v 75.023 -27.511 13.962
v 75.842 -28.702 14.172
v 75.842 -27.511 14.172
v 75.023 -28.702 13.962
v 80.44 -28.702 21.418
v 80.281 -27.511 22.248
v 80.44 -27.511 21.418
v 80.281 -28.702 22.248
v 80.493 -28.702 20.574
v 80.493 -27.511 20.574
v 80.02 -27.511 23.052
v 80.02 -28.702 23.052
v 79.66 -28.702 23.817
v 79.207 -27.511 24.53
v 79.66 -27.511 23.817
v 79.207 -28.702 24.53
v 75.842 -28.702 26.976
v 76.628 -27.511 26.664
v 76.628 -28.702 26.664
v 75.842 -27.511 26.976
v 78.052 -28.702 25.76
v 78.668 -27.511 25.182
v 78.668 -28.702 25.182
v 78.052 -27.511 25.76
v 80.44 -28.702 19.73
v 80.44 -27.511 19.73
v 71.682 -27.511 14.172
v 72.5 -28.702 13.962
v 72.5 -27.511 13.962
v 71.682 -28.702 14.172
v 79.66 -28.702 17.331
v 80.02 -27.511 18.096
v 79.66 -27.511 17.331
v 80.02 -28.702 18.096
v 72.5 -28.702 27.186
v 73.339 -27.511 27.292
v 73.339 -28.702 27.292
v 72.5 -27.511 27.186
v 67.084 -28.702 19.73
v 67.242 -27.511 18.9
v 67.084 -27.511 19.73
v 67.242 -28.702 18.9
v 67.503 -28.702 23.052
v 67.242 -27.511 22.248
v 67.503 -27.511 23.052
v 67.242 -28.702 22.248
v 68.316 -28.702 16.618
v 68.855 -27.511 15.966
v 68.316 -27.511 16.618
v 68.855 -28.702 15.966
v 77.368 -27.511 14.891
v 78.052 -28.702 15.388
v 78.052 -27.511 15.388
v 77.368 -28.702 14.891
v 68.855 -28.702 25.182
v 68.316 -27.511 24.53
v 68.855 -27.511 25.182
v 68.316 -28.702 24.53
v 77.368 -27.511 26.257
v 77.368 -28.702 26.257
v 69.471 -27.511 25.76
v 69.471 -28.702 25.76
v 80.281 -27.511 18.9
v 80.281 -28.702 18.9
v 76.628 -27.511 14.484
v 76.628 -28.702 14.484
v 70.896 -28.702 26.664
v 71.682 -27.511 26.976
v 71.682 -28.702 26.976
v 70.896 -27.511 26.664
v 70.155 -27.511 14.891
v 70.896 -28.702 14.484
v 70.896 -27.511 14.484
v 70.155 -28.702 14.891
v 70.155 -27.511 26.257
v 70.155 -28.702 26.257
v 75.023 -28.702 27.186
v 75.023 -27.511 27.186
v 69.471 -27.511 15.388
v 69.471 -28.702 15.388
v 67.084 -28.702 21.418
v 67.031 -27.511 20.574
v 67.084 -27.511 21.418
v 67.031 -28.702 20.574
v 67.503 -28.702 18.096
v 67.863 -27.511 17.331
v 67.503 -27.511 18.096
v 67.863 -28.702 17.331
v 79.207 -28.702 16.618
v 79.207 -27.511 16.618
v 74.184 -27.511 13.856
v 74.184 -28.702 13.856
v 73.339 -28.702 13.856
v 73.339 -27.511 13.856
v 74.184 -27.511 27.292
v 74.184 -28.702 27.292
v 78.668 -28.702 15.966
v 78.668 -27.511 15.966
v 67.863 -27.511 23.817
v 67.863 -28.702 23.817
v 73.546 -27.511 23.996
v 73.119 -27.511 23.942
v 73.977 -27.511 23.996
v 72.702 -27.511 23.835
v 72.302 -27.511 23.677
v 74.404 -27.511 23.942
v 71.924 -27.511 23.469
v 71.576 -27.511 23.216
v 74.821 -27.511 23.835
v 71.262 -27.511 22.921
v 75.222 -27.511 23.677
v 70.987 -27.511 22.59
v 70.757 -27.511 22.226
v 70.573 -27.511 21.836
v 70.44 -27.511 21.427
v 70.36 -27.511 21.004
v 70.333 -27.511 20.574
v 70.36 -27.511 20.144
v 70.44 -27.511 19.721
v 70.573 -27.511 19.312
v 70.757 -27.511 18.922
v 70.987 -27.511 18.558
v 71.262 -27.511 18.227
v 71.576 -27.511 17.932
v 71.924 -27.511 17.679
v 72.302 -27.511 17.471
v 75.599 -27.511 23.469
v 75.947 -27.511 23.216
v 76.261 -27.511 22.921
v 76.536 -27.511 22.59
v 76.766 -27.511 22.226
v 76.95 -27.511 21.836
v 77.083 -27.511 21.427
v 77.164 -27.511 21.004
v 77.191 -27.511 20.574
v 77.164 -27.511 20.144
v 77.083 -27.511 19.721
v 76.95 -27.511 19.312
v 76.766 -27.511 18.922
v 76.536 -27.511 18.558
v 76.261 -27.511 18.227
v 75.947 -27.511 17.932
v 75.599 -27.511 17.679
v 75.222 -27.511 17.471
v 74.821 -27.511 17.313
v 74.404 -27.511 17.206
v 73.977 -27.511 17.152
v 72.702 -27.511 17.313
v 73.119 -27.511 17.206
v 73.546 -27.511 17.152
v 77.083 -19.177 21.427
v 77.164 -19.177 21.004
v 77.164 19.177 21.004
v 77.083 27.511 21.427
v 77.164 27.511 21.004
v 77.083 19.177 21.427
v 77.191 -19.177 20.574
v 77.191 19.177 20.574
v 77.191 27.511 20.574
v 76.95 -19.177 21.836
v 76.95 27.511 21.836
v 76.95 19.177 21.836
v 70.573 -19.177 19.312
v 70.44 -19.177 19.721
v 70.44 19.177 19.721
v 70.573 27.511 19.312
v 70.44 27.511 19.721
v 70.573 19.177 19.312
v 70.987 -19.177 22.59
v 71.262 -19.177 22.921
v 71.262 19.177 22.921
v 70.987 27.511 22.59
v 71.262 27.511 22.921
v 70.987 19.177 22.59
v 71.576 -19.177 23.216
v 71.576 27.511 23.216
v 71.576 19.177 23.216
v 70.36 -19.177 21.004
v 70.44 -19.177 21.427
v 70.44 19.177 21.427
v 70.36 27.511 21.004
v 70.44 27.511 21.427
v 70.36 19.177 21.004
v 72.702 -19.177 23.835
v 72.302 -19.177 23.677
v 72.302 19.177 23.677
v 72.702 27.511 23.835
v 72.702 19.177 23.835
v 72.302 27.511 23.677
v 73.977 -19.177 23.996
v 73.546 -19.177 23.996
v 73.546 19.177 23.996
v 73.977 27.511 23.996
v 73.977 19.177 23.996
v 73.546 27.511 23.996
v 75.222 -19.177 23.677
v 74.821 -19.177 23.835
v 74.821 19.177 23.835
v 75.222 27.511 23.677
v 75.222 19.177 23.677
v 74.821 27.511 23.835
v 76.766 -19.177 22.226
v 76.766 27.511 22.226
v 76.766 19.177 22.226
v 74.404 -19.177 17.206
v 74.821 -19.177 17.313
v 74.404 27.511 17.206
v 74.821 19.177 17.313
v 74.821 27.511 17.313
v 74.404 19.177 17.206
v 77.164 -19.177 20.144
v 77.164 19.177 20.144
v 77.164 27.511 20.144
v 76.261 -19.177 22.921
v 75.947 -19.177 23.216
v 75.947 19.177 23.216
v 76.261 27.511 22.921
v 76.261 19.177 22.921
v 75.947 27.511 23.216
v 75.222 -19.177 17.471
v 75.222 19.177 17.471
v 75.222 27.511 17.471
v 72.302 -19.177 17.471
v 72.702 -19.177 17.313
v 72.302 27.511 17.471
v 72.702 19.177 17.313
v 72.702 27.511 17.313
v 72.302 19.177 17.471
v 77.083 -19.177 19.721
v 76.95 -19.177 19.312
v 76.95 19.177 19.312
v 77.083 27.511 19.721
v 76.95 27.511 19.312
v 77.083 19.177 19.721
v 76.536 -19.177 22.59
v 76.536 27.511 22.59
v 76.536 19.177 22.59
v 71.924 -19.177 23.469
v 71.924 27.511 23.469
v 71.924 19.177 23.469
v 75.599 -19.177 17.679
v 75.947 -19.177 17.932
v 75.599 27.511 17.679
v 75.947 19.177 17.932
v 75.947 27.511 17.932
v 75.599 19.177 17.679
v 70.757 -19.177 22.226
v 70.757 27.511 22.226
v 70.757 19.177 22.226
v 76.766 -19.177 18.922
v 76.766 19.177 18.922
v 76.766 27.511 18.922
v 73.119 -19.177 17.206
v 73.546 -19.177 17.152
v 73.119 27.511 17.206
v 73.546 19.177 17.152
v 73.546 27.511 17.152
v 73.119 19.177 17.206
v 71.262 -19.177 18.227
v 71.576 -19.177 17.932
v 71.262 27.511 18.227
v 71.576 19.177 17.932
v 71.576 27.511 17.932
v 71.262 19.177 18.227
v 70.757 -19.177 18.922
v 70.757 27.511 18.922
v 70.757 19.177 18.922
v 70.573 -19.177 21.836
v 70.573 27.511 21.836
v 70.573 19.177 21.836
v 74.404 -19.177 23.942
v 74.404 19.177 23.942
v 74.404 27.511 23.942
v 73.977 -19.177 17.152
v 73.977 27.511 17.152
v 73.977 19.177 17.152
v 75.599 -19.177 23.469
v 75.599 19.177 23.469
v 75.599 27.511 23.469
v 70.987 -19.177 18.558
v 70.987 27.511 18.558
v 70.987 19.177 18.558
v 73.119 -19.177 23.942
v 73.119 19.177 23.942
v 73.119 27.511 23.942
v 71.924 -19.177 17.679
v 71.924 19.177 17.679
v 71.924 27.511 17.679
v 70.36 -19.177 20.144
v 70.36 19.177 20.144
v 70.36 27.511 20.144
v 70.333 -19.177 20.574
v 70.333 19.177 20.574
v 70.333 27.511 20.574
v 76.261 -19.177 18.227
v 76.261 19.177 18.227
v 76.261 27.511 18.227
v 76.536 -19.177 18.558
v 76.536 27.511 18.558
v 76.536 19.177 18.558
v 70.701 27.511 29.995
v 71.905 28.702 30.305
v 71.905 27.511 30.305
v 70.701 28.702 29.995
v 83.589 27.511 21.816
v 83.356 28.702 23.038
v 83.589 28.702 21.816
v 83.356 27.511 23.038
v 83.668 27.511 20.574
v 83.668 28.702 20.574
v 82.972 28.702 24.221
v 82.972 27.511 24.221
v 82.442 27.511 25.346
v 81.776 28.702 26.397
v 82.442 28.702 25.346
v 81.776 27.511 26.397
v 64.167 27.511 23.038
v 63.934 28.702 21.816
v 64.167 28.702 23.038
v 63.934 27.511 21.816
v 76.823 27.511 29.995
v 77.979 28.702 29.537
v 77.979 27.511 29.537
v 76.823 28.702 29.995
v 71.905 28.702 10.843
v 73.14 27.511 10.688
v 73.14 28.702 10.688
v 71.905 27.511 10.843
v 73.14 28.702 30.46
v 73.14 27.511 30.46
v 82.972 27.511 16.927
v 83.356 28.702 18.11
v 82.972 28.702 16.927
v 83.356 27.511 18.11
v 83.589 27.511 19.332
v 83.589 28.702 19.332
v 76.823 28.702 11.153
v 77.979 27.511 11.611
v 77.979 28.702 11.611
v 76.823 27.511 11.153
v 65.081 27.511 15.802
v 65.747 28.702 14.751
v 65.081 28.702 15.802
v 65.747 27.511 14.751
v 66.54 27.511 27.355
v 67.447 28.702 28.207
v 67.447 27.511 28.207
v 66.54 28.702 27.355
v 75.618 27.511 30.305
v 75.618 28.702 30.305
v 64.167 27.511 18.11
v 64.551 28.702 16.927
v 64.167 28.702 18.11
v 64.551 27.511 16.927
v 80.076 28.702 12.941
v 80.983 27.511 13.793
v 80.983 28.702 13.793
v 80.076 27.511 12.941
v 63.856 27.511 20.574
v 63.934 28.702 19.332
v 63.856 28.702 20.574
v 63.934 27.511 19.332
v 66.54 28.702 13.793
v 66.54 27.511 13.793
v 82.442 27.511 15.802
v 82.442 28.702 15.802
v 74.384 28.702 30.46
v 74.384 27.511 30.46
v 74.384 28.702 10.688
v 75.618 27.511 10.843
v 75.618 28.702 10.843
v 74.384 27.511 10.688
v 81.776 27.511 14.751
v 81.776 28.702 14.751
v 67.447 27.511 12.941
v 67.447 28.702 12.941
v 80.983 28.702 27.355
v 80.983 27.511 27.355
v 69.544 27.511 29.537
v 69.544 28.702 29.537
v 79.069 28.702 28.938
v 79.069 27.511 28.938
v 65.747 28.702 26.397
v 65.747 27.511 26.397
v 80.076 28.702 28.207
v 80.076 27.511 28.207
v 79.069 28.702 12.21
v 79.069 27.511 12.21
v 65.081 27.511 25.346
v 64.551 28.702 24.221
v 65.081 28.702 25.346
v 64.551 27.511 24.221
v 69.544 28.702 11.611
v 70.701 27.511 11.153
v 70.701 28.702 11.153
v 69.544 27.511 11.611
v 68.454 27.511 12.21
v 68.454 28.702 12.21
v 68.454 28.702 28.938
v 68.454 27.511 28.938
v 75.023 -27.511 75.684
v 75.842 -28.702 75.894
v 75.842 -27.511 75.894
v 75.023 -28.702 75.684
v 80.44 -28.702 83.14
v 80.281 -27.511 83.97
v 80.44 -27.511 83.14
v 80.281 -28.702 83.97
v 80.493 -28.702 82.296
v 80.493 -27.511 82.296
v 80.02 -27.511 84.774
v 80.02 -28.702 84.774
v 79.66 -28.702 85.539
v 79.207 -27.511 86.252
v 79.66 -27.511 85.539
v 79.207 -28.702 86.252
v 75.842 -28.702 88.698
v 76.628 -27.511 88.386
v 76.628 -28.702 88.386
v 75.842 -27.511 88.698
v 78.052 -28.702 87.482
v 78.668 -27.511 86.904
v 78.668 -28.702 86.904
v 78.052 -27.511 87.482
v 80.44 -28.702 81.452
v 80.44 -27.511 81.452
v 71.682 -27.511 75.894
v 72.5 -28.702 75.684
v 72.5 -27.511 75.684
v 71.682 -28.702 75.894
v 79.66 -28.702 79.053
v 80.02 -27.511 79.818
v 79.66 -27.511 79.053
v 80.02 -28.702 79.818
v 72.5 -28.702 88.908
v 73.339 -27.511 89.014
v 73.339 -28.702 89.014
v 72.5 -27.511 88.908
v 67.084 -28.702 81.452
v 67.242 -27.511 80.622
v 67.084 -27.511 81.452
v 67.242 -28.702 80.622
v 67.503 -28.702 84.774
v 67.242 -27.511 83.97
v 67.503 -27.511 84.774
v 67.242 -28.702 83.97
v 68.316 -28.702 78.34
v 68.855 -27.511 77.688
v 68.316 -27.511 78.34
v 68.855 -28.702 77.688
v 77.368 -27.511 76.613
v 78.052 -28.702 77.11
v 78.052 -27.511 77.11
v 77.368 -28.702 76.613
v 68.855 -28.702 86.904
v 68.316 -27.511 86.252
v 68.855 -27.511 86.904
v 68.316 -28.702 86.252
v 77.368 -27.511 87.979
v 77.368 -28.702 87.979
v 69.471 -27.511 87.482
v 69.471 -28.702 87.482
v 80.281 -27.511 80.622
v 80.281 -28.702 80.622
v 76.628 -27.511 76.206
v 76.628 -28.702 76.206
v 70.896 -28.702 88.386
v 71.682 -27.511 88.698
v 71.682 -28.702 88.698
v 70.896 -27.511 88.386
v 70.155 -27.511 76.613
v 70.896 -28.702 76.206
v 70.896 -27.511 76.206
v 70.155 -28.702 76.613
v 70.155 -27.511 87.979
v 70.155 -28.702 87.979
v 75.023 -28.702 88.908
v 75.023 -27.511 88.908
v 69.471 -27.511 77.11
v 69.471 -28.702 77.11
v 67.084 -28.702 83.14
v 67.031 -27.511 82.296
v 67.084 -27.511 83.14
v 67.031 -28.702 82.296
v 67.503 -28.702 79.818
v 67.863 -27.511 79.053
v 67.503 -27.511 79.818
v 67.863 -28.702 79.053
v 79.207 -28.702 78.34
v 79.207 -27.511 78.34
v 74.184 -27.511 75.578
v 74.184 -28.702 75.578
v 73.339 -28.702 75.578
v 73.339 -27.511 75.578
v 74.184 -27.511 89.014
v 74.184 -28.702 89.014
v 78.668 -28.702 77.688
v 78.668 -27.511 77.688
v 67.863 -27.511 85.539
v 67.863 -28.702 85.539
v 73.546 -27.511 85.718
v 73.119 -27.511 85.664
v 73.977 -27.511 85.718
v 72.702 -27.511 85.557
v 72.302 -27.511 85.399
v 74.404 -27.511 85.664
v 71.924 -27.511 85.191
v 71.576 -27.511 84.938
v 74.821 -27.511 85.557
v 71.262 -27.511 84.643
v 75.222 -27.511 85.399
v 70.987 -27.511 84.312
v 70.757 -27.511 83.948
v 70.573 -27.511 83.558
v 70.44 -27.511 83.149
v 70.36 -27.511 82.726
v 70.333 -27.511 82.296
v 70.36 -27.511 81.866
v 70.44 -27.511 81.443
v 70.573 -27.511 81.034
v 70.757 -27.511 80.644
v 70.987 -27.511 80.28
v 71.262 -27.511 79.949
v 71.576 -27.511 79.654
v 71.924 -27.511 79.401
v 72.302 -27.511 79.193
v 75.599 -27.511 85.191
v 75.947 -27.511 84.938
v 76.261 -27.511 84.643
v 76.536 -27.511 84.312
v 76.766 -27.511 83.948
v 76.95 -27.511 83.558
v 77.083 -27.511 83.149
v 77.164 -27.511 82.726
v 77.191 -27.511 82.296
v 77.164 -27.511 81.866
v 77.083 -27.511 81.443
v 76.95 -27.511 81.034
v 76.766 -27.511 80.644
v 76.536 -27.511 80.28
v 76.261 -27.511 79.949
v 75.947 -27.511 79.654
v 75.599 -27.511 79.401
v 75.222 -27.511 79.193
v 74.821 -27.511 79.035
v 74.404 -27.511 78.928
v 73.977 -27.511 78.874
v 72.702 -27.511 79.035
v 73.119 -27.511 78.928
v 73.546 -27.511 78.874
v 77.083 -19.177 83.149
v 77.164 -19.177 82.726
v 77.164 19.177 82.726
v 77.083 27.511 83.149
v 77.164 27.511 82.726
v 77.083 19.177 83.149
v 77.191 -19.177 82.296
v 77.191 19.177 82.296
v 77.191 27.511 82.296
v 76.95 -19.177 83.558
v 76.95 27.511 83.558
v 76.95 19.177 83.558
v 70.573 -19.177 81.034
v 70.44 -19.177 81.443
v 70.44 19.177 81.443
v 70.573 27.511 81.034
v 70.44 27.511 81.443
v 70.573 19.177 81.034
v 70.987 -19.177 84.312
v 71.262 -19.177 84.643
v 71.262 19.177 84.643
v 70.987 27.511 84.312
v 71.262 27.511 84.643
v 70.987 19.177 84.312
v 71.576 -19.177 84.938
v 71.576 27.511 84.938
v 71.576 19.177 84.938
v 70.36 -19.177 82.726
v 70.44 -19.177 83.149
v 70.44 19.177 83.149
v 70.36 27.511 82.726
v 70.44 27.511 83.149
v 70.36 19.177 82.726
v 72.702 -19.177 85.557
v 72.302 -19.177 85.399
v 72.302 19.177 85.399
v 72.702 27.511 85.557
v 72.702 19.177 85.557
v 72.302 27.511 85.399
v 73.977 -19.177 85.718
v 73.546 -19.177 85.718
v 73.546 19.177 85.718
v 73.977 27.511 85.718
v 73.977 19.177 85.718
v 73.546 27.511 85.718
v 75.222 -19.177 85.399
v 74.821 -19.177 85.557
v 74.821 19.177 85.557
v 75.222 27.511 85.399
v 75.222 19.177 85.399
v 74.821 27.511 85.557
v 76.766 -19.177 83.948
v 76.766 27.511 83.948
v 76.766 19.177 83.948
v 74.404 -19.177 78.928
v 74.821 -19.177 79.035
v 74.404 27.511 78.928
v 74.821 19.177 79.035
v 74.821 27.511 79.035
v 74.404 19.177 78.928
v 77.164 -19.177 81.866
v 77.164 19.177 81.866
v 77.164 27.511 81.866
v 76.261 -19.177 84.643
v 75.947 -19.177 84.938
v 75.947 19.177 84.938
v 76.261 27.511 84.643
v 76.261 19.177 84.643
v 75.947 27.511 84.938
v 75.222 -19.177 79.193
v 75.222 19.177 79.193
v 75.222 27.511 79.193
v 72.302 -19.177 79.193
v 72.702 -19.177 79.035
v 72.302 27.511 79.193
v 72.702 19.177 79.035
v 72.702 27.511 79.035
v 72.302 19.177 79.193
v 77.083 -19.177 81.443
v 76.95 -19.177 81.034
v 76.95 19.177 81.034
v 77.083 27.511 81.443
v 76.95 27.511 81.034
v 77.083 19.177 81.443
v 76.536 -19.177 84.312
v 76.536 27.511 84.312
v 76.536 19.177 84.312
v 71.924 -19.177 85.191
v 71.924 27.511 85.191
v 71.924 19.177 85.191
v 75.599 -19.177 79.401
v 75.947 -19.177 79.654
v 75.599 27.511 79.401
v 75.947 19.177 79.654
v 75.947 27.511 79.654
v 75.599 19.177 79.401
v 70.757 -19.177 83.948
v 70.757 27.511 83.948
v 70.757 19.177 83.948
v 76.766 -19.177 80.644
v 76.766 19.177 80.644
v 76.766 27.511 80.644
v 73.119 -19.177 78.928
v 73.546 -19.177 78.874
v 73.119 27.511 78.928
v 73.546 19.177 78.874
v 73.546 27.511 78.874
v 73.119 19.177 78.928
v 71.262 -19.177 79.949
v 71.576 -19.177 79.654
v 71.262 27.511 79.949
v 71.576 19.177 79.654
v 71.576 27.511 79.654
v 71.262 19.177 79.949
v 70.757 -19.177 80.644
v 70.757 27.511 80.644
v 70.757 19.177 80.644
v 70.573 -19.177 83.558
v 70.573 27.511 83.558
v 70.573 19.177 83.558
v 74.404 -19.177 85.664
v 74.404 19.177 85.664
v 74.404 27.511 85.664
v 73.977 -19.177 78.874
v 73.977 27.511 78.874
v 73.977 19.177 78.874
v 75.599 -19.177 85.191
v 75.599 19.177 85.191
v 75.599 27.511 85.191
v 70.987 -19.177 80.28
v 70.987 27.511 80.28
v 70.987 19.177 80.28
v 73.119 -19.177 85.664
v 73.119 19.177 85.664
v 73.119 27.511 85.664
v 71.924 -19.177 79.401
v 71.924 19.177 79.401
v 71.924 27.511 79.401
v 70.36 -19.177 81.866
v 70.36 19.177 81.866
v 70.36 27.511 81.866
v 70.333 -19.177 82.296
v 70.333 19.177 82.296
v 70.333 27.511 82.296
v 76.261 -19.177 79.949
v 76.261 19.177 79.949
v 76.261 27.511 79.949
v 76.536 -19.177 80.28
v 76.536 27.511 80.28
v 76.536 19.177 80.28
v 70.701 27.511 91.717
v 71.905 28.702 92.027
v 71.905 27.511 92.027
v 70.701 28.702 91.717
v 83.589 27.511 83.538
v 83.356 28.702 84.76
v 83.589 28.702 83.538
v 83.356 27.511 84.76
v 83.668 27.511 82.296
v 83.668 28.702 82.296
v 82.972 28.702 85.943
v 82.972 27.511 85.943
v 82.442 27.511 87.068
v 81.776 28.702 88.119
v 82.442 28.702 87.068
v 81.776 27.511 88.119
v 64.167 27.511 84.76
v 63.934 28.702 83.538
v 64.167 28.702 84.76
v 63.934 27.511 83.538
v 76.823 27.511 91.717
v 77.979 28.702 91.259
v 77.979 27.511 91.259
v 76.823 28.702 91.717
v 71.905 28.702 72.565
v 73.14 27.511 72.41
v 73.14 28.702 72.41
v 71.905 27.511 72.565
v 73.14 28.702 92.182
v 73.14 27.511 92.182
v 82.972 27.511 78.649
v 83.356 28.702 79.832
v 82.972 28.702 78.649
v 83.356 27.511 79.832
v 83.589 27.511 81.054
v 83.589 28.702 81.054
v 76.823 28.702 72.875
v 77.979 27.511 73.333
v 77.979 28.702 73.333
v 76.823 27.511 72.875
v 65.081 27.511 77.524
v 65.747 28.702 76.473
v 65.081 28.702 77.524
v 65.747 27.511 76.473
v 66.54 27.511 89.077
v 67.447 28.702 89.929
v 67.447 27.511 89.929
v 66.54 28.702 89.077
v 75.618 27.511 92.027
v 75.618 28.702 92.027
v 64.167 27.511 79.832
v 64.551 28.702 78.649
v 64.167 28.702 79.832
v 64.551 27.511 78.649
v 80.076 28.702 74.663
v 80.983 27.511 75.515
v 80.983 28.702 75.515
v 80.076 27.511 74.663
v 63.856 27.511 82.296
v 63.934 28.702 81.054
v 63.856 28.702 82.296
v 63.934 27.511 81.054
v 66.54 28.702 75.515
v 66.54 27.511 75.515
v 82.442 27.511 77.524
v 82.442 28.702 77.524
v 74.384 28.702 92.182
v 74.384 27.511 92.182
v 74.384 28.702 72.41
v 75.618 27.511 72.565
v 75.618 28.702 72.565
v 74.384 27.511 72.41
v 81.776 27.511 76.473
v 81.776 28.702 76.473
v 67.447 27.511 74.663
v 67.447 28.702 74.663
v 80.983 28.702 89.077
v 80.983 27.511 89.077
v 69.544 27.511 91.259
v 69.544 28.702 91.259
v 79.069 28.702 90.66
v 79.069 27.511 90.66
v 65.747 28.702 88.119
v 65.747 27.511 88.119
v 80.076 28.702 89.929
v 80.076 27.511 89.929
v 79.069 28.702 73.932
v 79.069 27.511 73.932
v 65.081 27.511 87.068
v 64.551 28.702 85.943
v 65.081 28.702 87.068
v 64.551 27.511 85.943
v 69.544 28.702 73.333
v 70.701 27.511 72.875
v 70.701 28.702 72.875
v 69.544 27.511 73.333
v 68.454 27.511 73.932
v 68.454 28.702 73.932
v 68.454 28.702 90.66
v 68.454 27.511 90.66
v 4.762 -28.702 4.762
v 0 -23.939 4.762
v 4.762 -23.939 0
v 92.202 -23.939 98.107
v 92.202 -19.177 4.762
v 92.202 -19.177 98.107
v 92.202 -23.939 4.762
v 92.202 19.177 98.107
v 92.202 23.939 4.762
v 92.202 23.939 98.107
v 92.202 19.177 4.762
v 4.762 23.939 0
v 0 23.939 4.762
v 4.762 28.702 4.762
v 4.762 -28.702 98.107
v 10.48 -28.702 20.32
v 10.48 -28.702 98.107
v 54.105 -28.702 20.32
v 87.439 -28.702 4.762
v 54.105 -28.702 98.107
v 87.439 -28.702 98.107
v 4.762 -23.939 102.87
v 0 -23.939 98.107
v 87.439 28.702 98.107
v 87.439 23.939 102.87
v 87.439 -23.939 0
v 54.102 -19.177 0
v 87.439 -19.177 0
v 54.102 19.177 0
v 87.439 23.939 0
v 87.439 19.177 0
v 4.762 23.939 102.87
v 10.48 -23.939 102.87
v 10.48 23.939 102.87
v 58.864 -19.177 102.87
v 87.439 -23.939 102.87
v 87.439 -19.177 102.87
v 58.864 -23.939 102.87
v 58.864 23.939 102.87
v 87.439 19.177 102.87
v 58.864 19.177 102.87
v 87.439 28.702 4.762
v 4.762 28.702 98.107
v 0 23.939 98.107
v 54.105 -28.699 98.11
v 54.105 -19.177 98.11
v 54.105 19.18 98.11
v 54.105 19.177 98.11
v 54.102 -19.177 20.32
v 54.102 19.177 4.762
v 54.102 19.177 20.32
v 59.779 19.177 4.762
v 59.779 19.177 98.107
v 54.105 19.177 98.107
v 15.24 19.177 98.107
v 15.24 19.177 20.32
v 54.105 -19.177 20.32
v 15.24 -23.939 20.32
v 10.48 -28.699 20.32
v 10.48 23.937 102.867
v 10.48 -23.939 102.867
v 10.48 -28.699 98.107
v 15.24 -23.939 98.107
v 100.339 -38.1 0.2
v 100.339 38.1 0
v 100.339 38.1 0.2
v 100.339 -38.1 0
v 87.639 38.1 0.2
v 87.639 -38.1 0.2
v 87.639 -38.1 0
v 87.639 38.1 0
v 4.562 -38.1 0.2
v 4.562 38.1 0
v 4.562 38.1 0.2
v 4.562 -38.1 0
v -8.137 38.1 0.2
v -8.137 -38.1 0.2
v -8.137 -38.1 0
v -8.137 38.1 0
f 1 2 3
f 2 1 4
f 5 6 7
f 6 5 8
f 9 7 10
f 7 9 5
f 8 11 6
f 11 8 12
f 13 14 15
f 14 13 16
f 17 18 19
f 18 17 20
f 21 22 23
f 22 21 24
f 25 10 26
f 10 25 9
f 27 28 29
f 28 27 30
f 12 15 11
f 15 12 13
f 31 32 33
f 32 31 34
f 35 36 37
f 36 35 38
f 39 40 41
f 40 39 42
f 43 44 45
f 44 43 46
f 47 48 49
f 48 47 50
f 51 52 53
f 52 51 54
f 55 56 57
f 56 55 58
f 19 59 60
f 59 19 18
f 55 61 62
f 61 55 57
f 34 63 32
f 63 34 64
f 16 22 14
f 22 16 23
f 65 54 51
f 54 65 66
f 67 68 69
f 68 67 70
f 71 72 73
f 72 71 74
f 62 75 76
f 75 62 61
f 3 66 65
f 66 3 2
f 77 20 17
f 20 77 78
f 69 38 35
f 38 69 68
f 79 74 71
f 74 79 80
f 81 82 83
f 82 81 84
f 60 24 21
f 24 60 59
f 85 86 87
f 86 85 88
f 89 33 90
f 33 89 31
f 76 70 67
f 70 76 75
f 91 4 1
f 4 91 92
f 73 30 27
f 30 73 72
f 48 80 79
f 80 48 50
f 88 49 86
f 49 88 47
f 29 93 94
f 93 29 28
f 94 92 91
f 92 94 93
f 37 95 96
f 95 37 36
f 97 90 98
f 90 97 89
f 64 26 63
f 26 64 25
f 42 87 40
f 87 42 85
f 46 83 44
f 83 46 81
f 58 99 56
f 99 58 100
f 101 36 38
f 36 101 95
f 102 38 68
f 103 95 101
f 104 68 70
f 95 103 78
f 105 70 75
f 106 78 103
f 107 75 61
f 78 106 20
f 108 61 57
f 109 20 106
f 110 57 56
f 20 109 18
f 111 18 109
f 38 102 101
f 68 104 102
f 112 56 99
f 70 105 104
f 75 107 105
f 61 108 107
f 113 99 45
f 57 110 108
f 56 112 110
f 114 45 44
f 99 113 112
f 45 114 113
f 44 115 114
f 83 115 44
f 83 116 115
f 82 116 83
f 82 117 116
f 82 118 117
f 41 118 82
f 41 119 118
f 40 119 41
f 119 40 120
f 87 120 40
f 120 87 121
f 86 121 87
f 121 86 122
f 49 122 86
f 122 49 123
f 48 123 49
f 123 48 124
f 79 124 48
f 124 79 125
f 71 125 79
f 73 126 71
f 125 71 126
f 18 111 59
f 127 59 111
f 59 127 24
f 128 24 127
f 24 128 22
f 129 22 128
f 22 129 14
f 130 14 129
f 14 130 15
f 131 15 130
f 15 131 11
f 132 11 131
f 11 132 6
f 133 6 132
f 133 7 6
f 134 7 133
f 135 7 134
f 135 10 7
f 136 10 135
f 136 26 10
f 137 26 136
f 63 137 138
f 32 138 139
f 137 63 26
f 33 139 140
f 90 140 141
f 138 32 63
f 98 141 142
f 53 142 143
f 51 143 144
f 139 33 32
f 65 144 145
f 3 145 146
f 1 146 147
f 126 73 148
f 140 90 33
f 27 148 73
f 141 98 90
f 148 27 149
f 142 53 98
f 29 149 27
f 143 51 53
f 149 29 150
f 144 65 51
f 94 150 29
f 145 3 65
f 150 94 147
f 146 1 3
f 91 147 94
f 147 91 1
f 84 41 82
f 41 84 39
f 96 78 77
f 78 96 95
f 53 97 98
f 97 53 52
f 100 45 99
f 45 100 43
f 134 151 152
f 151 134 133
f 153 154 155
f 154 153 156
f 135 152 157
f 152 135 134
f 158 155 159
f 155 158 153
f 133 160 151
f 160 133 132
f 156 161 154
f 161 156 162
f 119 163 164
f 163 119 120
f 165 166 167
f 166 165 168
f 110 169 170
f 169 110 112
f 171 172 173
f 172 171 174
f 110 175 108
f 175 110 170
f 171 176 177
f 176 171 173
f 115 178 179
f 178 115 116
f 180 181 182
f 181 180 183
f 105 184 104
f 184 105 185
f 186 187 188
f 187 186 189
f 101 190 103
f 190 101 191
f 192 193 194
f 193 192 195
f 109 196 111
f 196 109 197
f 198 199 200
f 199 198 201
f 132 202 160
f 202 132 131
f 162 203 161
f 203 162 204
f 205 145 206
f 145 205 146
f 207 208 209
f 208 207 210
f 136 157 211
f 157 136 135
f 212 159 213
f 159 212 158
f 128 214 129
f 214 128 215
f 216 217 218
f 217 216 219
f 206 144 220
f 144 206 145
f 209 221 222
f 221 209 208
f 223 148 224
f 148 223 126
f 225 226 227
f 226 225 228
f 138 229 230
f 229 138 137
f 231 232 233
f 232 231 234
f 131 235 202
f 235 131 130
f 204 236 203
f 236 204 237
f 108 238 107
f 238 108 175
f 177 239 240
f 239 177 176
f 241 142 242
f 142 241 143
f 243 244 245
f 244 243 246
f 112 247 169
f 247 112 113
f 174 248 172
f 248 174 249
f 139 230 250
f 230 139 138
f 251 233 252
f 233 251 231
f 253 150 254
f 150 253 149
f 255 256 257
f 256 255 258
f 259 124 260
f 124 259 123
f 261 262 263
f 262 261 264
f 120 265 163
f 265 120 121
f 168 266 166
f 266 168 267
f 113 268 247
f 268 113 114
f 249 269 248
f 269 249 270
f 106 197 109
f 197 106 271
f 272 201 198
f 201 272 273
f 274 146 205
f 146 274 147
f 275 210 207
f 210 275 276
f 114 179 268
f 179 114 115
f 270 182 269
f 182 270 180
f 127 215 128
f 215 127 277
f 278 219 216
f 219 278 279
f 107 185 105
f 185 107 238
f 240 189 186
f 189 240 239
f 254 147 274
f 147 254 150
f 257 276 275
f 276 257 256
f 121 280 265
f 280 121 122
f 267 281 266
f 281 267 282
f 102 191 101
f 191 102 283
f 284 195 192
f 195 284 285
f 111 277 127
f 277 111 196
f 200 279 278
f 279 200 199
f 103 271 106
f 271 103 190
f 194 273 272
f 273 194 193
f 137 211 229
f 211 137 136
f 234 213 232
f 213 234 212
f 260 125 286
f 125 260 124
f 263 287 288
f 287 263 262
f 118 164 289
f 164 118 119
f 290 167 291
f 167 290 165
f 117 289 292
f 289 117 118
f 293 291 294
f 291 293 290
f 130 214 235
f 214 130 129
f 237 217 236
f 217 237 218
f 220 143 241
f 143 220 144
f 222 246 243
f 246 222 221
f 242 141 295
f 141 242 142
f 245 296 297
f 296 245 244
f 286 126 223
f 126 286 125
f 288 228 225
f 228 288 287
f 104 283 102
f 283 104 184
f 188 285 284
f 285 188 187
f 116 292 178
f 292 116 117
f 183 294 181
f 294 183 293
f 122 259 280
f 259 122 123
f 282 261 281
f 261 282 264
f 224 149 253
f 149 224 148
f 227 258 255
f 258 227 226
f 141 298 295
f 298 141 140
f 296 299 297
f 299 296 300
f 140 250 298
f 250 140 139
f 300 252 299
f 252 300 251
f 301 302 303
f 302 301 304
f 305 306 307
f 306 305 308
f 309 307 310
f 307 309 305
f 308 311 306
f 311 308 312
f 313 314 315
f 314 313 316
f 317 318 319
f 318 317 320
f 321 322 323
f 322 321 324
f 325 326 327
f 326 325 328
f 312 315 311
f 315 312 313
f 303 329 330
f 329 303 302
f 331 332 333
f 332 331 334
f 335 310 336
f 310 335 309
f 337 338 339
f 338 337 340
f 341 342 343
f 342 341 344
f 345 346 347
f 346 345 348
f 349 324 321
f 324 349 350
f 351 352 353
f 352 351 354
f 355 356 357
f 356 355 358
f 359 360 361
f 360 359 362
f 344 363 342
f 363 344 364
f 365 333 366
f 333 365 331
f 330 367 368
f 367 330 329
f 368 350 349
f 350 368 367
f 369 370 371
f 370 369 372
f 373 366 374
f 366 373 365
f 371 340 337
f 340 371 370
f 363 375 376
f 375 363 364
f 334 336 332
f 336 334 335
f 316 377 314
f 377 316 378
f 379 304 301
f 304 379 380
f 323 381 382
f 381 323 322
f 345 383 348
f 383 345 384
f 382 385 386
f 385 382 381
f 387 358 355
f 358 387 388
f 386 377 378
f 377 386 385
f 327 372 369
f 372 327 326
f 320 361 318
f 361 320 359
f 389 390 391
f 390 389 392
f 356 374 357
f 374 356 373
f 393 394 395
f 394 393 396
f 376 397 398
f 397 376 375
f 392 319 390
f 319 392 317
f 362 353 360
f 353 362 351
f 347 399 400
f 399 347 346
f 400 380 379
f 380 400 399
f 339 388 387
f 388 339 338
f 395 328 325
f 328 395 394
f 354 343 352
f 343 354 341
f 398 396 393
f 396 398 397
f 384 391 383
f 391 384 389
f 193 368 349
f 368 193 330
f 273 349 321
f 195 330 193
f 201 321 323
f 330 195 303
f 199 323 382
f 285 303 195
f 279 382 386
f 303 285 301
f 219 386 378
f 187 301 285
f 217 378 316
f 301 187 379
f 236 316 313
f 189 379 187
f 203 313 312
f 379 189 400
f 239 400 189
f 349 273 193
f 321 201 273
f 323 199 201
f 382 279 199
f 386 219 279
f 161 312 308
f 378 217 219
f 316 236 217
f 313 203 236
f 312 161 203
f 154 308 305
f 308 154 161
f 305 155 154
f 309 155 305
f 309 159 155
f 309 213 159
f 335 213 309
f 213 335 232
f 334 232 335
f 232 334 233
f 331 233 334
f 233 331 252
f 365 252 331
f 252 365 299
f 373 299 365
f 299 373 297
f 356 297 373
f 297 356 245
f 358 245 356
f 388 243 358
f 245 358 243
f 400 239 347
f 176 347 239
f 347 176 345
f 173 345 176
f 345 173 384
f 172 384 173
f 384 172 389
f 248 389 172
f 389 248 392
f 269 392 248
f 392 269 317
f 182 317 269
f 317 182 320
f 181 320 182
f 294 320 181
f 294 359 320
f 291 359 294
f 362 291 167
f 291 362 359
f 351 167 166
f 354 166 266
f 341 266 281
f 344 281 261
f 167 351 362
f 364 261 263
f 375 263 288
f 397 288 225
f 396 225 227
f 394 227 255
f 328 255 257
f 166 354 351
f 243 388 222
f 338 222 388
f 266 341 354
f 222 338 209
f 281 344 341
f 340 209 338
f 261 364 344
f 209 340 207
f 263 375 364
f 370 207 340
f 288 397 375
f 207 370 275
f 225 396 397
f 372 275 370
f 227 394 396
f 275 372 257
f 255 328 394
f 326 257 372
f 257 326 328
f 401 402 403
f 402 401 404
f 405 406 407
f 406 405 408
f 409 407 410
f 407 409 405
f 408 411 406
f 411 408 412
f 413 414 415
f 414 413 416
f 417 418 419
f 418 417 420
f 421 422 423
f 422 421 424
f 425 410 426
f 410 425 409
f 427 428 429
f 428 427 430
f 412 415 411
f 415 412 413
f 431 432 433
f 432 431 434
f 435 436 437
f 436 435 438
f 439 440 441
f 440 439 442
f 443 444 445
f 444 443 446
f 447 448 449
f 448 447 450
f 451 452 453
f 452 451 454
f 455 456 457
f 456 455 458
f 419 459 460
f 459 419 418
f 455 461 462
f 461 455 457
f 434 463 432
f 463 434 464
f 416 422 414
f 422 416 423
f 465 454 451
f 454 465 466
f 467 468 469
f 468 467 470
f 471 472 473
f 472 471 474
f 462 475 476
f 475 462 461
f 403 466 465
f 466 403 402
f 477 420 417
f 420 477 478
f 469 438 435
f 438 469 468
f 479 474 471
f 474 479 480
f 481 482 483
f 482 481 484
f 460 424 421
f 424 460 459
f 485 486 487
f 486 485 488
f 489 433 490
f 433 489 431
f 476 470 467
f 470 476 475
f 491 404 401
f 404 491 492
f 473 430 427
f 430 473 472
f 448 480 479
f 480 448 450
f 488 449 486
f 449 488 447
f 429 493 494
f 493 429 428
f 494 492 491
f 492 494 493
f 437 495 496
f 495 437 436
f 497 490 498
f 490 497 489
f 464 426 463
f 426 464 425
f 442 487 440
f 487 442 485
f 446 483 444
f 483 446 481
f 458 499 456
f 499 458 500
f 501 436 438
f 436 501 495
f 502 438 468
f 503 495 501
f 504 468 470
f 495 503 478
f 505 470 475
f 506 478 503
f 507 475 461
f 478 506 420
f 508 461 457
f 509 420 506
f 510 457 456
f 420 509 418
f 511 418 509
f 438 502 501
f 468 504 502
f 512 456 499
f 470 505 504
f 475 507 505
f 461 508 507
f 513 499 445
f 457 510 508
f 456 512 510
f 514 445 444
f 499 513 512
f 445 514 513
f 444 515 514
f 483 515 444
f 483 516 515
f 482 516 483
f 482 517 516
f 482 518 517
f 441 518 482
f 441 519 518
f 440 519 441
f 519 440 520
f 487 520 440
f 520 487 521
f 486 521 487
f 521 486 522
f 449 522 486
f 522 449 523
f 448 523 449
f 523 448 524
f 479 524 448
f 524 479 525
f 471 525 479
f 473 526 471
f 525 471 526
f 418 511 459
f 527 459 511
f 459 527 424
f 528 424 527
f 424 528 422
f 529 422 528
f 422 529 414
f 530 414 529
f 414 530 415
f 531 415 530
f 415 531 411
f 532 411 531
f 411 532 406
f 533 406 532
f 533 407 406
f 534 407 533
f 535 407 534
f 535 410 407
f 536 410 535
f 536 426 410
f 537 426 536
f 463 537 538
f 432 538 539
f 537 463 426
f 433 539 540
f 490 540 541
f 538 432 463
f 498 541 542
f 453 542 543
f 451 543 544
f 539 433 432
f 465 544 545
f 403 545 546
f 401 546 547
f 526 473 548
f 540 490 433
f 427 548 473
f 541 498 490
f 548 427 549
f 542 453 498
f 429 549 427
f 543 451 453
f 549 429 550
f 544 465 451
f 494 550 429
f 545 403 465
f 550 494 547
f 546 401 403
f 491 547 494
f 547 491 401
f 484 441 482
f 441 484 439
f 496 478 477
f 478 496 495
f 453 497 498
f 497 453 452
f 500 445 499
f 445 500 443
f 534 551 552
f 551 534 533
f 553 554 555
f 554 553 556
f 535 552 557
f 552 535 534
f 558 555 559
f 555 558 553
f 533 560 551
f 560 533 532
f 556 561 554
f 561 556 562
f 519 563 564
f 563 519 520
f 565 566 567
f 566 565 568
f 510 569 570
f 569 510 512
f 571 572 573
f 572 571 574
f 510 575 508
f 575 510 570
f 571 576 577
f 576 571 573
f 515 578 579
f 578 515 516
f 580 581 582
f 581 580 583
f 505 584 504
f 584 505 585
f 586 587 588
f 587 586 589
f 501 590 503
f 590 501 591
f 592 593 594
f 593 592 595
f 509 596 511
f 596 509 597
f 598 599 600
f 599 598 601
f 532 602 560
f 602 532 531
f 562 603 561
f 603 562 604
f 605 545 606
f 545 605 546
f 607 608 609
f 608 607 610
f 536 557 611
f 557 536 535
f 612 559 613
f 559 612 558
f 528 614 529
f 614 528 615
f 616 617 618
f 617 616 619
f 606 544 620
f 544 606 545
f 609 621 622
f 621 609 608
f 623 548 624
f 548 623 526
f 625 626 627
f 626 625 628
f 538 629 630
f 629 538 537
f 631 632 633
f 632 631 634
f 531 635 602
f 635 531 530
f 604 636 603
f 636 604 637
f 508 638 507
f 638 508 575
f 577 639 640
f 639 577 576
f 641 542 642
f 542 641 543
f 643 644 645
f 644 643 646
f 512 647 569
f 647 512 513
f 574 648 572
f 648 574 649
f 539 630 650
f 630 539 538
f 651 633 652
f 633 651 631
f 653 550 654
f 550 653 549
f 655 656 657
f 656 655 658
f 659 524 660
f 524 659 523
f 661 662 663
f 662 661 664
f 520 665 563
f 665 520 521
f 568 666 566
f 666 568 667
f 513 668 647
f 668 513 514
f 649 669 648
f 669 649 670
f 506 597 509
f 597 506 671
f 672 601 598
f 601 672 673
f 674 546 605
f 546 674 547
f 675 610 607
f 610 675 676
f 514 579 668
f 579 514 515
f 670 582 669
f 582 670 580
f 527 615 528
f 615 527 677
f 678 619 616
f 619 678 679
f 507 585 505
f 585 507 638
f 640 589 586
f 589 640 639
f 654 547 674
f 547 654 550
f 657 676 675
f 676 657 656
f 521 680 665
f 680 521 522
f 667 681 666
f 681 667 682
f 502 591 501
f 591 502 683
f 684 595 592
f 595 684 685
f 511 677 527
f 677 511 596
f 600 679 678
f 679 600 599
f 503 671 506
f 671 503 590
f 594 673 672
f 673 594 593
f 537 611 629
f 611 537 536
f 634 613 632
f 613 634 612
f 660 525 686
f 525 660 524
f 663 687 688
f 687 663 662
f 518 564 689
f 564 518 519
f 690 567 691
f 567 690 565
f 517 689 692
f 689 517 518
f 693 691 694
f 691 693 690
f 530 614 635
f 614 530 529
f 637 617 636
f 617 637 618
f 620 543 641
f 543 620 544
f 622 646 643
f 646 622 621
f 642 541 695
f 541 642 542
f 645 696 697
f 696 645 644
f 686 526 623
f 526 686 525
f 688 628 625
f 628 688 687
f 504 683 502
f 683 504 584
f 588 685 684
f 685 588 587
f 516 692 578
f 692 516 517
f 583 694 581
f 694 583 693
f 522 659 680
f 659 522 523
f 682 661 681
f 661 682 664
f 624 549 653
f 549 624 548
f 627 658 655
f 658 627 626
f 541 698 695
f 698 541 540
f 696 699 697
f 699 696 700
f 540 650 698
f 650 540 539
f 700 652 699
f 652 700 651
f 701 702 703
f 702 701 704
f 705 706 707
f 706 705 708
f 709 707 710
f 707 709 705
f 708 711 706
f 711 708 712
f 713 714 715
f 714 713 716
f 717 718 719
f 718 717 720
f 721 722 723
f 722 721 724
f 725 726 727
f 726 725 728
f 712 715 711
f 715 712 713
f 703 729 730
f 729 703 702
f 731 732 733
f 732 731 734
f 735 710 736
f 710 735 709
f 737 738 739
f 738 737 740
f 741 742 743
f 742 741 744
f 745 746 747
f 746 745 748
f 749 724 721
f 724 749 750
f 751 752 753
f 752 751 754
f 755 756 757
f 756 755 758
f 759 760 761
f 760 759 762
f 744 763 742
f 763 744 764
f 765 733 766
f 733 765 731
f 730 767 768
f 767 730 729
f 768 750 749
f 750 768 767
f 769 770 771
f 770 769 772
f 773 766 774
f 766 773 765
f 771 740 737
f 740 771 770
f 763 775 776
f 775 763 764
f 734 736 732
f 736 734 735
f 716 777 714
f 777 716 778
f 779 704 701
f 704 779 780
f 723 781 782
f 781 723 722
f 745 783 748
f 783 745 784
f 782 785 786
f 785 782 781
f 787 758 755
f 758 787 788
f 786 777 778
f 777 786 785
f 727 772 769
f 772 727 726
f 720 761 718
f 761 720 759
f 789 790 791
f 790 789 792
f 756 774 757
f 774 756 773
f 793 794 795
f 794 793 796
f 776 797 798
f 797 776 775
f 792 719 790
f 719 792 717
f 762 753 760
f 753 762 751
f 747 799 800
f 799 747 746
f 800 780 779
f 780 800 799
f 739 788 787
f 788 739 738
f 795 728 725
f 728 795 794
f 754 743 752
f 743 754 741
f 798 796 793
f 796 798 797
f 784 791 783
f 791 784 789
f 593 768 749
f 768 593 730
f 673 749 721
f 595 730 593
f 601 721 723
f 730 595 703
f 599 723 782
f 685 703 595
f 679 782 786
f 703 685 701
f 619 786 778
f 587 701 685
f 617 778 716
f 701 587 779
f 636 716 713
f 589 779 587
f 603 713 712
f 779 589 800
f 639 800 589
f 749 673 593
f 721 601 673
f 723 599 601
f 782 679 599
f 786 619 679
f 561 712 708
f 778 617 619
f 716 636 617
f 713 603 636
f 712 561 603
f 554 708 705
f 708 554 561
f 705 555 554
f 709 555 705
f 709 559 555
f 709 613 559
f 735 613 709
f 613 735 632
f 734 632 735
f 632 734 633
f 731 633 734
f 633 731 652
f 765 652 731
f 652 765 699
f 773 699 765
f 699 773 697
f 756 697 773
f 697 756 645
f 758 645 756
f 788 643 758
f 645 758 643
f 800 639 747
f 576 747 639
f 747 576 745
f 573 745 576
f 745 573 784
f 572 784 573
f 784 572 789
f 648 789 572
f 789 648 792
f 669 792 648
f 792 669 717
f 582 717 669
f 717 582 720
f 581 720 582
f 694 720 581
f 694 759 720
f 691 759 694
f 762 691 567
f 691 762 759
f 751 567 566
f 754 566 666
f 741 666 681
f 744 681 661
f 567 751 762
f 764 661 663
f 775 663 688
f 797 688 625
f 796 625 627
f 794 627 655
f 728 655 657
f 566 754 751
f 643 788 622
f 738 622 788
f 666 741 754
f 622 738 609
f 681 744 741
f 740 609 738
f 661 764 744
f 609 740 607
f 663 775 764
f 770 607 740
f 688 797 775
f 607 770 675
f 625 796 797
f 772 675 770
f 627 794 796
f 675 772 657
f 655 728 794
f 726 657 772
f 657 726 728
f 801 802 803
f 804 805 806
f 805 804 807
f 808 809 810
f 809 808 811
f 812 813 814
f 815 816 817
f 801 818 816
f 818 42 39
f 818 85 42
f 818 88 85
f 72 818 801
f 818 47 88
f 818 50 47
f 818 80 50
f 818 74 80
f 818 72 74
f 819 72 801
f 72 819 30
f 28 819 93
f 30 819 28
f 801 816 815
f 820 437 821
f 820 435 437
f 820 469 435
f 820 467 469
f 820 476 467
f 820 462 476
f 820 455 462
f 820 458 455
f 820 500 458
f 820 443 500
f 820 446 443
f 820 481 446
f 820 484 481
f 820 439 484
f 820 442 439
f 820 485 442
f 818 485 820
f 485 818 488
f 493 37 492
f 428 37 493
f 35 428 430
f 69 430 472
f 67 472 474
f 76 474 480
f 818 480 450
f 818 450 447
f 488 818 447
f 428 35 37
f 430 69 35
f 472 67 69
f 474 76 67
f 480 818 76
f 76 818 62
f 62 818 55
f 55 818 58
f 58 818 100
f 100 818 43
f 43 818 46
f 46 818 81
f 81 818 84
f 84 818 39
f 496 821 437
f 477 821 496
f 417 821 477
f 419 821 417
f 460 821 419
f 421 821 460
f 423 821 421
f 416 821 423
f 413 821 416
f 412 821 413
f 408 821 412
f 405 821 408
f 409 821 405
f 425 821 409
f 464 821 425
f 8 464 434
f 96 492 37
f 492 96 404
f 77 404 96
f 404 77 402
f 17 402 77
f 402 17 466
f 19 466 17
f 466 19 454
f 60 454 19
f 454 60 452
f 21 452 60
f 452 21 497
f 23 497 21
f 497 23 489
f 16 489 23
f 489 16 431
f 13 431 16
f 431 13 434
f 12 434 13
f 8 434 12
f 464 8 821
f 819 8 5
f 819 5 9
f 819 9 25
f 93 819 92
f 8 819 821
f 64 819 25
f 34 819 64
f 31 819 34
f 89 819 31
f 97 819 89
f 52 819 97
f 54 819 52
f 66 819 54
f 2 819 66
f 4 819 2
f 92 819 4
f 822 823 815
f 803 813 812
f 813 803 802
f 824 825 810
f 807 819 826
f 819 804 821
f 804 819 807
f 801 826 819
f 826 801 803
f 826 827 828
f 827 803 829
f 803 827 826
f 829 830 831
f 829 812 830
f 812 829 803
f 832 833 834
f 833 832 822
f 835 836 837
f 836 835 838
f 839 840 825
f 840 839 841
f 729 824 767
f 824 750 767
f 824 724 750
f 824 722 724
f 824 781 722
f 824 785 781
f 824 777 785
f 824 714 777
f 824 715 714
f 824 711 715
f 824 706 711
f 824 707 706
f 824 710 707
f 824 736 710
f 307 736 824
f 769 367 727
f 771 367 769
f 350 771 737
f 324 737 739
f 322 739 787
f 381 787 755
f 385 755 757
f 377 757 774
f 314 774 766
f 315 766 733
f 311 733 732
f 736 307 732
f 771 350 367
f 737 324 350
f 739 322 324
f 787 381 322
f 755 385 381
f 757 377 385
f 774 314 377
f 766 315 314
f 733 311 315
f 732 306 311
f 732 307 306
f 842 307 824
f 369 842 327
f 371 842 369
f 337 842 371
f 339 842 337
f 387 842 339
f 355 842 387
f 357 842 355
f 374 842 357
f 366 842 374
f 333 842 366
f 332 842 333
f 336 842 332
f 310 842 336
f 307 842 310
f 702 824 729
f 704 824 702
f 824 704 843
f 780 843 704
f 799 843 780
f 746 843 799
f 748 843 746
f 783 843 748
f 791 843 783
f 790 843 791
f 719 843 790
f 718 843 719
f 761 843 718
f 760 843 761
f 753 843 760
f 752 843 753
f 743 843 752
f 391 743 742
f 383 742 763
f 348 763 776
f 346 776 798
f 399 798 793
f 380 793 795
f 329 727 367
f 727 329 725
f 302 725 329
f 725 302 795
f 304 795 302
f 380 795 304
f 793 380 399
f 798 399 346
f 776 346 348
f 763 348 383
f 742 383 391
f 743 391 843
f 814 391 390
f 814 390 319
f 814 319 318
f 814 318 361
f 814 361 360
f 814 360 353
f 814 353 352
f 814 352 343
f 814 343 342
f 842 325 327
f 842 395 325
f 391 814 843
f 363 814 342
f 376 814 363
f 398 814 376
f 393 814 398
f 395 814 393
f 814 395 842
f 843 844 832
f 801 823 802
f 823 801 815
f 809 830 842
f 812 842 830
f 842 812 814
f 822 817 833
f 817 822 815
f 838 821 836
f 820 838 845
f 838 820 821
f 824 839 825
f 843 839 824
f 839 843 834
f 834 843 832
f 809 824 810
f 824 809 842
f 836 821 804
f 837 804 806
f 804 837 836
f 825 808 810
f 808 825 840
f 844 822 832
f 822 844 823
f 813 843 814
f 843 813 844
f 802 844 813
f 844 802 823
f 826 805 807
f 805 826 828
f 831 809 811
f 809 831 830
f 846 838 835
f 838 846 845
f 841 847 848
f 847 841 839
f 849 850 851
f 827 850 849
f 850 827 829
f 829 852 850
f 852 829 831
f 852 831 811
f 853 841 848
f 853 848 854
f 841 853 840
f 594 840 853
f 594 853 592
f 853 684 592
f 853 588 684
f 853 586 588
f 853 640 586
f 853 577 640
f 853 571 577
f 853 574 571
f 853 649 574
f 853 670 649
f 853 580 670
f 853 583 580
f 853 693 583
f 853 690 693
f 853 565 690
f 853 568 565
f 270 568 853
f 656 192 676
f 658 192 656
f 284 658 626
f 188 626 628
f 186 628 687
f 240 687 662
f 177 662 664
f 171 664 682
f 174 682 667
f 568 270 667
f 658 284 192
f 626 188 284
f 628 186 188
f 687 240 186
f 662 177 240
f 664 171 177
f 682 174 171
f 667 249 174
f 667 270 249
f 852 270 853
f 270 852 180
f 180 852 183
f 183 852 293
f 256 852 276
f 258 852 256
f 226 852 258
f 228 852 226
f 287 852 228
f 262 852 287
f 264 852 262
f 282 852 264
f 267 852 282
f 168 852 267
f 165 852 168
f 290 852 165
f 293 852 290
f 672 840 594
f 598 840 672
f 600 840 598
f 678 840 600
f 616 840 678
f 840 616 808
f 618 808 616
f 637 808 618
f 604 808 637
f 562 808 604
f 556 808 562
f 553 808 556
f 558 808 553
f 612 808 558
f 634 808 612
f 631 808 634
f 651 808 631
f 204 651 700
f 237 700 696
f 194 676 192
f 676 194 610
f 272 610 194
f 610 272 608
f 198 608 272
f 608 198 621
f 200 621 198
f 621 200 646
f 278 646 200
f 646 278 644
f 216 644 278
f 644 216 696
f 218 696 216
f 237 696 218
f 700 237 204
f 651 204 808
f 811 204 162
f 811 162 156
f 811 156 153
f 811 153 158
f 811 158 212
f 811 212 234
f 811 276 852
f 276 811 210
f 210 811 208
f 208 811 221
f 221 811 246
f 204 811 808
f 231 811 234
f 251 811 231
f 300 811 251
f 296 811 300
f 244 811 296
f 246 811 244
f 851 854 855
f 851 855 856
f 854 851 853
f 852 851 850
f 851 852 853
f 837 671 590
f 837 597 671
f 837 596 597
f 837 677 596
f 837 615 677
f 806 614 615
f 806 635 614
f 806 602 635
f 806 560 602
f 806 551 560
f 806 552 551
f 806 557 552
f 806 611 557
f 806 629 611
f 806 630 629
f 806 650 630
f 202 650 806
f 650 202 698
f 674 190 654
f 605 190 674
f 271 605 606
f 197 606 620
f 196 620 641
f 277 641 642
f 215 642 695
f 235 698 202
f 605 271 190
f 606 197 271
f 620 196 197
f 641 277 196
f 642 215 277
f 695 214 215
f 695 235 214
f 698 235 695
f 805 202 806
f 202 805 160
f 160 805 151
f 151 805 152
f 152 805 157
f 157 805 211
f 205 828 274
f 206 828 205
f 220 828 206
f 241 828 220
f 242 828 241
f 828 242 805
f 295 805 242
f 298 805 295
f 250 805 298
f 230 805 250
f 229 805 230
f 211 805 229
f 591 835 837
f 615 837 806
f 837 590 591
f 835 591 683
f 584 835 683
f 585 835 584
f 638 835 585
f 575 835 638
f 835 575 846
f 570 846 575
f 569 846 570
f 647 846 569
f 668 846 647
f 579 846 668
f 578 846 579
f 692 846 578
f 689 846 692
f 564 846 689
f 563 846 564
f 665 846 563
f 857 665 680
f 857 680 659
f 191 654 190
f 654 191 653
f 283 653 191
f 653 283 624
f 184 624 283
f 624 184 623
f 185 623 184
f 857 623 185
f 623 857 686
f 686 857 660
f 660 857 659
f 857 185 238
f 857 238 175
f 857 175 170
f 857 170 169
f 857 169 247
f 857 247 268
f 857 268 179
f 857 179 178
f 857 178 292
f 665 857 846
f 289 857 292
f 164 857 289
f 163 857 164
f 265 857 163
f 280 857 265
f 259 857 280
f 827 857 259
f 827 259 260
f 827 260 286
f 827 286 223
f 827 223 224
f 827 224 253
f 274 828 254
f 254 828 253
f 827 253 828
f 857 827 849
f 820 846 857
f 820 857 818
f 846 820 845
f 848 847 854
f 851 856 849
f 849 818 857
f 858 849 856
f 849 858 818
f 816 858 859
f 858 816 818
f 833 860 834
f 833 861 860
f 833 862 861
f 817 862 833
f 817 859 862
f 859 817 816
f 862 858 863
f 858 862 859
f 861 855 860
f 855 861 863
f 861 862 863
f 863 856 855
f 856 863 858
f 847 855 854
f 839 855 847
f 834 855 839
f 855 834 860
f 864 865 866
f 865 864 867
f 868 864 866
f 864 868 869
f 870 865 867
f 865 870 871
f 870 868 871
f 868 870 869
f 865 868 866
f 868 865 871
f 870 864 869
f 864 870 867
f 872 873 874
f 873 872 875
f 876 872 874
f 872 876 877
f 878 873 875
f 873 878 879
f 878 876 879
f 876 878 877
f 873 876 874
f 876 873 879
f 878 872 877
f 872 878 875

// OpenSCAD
tight = 0.01;
slack = 0.03;
plate_thickness = 3/8;
bottom_height = 0.8;
finger_thickness = 0.6;

length = 1.5 + 1.5 + finger_thickness + slack;
width = 1.5 + tight + 2*plate_thickness;
height = 3.25 + bottom_height;

head_countersink_diameter = 0.53;
tail_countersink_diameter = 0.78;
countersink_depth = 3/64;
hole_diameter = 0.27;

module octahedron(major_radius=1) {
  // Top and bottom halves.
  for (a = [-1, 1])
    scale([1, 1, a])
      // Extrude a square into a pyramid.
      linear_extrude(major_radius, scale=0)
        rotate([0, 0, 45])
          square(sqrt(2)*major_radius, center=true);
}

module chamfered_cube(dims, chamfer=1) {
  assert(dims.x >= 2*chamfer);
  assert(dims.y >= 2*chamfer);
  assert(dims.z >= 2*chamfer);

  hull()
    for (a = [0, 1], b = [0, 1], c = [0, 1])
        translate([
          (dims.x - 2*chamfer) * a + chamfer,
          (dims.y - 2*chamfer) * b + chamfer,
          (dims.z - 2*chamfer) * c + chamfer
        ])
          octahedron(chamfer);
}

$fn = 50;
chamfer = 3/16;

module bracket() {
  // Fill in the finger with nice chamfers.
  translate([0, -width/2, 0])
    chamfered_cube([finger_thickness, width, height], chamfer);

  translate([0, width/2 - plate_thickness, 0])
    chamfered_cube([length*0.7, plate_thickness, height], chamfer);
  
  // Brim.
  translate([length - chamfer + 0.2/25.4, -1.5, 0])
    cube([0.5, 3, 0.2/25.4]);
  translate([-0.5 + chamfer - 0.2/25.4, -1.5, 0])
    cube([0.5, 3, 0.2/25.4]);
  
  difference() {
    translate([0, -width/2, 0])
      chamfered_cube([length, width, height], chamfer);
    
    // Chamfer.
    translate([1.5 + finger_thickness + slack, 0, height])
      rotate([0, 45, 0])
        cube([chamfer*sqrt(2), 10, chamfer*sqrt(2)], center=true);
    
    // Vertical.
    translate([5 + finger_thickness + 1.5 + slack, 0, 0])
      cube([10, 1.5 + tight, 10], center=true);
    
    // Rail.
    translate([finger_thickness + 0.0001 - chamfer, -10 + 1.5/2 + tight/2 + chamfer, bottom_height])
      cube([1.5 + slack + chamfer, 10, 10]);
    
    // Countersink.
    for (a = [0.2, 0.8]) {
      translate([length*0.8, -width/2, a*height]) {
        rotate([90, 0, 0]) {
          // Head countersink.
          translate([0, 0, -countersink_depth])
            cylinder(1, d=head_countersink_diameter);
          
          // Bolt countersink.
          translate([0, 0, -10])
            cylinder(20, d=hole_diameter);
          
          // Tail countersink.
          translate([0, 0, -1 + countersink_depth - width])
            cylinder(1, d=tail_countersink_diameter);
        }
      }
    }
  }
}

module print() {
  // Convert from inches to millimeters.
  scale([1, 1, 1] * 25.4)
    bracket();
}

print();
